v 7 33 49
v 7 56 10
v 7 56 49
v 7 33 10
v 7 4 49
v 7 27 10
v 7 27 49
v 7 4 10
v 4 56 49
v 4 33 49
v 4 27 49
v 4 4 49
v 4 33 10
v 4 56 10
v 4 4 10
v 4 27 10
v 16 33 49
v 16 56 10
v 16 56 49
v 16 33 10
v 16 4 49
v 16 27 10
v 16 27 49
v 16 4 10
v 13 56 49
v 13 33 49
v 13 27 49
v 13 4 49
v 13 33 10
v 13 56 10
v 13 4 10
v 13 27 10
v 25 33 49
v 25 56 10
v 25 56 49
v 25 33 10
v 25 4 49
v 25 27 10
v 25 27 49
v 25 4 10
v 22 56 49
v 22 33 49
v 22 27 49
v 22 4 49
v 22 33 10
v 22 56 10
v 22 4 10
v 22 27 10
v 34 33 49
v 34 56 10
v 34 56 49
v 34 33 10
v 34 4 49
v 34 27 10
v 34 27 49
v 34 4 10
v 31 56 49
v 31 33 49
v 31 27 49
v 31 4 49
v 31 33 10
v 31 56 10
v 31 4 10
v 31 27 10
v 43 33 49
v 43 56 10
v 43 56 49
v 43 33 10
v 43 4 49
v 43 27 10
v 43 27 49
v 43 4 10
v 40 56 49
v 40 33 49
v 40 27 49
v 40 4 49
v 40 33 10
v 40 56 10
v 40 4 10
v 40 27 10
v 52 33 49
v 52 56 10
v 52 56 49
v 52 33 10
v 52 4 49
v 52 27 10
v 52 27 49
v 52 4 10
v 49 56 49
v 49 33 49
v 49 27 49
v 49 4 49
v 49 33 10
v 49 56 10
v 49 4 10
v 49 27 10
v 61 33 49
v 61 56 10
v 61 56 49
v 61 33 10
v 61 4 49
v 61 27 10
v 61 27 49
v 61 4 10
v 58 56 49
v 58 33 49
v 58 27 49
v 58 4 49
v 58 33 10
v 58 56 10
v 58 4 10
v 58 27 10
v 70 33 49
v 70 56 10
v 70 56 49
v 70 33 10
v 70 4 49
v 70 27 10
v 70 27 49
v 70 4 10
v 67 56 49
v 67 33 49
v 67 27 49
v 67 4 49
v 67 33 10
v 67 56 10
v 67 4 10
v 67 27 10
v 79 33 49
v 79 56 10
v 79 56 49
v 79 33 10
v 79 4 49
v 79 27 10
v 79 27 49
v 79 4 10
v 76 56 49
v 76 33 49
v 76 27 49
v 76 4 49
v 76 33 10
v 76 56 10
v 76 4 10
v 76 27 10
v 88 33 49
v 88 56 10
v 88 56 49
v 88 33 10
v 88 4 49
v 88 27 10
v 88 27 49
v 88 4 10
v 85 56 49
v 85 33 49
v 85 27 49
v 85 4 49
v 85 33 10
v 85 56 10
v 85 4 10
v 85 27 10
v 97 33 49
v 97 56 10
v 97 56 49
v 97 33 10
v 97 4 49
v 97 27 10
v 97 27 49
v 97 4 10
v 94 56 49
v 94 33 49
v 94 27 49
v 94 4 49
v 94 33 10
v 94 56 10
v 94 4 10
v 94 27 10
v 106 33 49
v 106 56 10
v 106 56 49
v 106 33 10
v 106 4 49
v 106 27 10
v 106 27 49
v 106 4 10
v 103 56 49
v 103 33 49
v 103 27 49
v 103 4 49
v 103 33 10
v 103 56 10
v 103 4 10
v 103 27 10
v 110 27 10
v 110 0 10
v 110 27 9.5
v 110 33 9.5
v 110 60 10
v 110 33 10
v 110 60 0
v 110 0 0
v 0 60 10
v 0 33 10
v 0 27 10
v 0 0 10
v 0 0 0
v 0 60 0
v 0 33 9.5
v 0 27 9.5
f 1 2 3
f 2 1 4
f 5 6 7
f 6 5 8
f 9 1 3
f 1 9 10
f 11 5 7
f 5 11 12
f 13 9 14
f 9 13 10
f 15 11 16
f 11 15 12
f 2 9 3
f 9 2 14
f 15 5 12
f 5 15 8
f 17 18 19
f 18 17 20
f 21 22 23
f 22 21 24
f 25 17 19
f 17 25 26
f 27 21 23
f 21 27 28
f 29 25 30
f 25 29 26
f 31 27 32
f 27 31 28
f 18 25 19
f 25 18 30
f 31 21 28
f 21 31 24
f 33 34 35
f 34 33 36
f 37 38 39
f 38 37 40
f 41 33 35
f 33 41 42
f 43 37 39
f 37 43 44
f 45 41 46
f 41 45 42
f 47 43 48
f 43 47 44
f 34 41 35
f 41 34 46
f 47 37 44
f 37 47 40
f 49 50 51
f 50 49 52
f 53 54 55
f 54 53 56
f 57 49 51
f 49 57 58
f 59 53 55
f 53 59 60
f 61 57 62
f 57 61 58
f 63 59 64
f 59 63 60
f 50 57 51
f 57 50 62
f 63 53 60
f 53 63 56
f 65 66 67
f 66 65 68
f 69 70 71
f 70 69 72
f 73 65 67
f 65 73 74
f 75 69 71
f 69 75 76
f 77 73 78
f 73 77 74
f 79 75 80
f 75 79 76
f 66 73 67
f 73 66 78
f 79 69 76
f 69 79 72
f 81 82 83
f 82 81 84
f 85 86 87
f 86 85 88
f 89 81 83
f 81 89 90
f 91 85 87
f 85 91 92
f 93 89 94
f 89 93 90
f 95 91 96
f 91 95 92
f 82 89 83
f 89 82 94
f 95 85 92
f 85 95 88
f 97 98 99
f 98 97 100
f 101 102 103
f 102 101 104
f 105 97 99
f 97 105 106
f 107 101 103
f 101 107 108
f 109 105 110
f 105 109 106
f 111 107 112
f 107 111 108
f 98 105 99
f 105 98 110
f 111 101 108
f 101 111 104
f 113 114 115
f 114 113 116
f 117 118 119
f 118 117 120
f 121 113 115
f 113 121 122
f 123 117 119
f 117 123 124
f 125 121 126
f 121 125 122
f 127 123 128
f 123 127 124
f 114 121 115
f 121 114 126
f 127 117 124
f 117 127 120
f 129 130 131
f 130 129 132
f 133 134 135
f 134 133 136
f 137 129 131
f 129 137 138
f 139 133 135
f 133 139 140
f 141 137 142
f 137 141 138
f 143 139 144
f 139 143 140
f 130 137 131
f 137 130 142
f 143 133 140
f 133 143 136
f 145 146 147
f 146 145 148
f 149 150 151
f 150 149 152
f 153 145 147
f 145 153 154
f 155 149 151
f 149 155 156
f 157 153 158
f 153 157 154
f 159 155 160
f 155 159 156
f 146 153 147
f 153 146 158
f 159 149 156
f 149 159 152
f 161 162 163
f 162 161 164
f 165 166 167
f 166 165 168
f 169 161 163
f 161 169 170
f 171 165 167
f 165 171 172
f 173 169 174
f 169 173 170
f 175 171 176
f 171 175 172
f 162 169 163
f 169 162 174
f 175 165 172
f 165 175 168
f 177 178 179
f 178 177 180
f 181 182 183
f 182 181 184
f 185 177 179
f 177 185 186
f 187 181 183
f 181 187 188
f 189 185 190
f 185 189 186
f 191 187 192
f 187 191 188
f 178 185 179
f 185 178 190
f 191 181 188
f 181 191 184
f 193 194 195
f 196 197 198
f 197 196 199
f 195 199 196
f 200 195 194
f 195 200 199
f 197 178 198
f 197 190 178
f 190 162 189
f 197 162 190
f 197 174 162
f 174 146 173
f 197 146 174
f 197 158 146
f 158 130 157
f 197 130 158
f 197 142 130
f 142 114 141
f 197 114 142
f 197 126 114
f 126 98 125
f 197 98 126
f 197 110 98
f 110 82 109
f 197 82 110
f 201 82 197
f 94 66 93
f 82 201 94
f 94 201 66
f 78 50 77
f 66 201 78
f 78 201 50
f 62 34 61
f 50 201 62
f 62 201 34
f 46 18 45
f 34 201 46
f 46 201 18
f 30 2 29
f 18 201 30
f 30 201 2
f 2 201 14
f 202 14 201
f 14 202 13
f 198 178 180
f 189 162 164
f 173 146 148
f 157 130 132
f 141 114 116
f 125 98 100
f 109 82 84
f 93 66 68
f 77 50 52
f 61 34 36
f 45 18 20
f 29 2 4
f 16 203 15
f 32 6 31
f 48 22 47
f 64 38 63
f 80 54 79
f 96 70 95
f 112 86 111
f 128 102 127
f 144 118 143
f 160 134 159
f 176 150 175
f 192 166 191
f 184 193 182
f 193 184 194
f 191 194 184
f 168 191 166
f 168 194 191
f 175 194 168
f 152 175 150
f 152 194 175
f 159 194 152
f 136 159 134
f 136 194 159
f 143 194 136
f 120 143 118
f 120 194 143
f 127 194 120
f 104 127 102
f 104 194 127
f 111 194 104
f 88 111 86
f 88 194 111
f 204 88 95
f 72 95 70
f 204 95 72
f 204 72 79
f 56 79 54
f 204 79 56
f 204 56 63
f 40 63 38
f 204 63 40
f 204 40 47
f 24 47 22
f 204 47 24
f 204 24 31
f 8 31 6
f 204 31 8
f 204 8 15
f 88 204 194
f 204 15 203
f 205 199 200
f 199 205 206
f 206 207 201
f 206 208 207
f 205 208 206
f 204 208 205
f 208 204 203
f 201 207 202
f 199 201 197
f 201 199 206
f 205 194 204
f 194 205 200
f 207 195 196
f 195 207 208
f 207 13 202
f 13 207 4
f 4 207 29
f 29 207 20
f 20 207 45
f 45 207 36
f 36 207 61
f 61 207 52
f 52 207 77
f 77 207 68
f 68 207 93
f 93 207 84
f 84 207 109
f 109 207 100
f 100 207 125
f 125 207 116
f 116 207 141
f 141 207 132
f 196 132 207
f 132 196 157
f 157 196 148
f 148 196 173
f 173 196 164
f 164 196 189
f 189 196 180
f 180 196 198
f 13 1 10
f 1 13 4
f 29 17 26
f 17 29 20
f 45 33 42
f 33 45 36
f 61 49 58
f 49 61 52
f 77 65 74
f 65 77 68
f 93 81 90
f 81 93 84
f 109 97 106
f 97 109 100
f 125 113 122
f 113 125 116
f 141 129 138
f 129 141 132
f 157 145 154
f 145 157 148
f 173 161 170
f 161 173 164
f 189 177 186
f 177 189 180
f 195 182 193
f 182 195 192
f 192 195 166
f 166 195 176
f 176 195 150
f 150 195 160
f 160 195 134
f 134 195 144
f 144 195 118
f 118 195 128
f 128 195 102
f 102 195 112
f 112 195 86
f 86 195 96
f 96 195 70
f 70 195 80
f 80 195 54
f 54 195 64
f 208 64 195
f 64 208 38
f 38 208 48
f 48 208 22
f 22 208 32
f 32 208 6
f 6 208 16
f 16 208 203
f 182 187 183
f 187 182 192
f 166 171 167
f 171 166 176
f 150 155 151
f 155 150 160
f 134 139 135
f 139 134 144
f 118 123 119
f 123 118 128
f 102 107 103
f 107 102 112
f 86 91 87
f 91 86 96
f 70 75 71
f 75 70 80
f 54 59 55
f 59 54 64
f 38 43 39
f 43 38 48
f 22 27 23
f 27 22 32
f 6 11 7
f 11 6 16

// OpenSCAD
$fn = 32;

// ----------------------------------------------------------------------
// Heatsink: slotted fin block
// ----------------------------------------------------------------------

// --- parameters (mm) ---
base_l = 110;             // base length, X
base_w = 60;              // base width, Y
base_t = 10;              // base plate thickness
fin_h = 40;               // fin height above the base
fin_t = 3;                // fin thickness
edge = 4;                 // margin from the base ends
pitch = 9;                // fin pitch
slot_w = 6;               // central slot width, Y

n_fins = floor((base_l - 2 * edge - fin_t) / pitch) + 1;  // fin count
total_h = base_t + fin_h - 1;  // overall height

difference() {
union() {
  cube([base_l, base_w, base_t]);
  for (i = [0 : n_fins - 1])
    translate([edge + i * pitch, edge, base_t - 1])
      cube([fin_t, base_w - 2 * edge, fin_h]);
}
  translate([-1, base_w / 2 - slot_w / 2, base_t - 0.5])
    cube([base_l + 2, slot_w, fin_h + 2]);
}
